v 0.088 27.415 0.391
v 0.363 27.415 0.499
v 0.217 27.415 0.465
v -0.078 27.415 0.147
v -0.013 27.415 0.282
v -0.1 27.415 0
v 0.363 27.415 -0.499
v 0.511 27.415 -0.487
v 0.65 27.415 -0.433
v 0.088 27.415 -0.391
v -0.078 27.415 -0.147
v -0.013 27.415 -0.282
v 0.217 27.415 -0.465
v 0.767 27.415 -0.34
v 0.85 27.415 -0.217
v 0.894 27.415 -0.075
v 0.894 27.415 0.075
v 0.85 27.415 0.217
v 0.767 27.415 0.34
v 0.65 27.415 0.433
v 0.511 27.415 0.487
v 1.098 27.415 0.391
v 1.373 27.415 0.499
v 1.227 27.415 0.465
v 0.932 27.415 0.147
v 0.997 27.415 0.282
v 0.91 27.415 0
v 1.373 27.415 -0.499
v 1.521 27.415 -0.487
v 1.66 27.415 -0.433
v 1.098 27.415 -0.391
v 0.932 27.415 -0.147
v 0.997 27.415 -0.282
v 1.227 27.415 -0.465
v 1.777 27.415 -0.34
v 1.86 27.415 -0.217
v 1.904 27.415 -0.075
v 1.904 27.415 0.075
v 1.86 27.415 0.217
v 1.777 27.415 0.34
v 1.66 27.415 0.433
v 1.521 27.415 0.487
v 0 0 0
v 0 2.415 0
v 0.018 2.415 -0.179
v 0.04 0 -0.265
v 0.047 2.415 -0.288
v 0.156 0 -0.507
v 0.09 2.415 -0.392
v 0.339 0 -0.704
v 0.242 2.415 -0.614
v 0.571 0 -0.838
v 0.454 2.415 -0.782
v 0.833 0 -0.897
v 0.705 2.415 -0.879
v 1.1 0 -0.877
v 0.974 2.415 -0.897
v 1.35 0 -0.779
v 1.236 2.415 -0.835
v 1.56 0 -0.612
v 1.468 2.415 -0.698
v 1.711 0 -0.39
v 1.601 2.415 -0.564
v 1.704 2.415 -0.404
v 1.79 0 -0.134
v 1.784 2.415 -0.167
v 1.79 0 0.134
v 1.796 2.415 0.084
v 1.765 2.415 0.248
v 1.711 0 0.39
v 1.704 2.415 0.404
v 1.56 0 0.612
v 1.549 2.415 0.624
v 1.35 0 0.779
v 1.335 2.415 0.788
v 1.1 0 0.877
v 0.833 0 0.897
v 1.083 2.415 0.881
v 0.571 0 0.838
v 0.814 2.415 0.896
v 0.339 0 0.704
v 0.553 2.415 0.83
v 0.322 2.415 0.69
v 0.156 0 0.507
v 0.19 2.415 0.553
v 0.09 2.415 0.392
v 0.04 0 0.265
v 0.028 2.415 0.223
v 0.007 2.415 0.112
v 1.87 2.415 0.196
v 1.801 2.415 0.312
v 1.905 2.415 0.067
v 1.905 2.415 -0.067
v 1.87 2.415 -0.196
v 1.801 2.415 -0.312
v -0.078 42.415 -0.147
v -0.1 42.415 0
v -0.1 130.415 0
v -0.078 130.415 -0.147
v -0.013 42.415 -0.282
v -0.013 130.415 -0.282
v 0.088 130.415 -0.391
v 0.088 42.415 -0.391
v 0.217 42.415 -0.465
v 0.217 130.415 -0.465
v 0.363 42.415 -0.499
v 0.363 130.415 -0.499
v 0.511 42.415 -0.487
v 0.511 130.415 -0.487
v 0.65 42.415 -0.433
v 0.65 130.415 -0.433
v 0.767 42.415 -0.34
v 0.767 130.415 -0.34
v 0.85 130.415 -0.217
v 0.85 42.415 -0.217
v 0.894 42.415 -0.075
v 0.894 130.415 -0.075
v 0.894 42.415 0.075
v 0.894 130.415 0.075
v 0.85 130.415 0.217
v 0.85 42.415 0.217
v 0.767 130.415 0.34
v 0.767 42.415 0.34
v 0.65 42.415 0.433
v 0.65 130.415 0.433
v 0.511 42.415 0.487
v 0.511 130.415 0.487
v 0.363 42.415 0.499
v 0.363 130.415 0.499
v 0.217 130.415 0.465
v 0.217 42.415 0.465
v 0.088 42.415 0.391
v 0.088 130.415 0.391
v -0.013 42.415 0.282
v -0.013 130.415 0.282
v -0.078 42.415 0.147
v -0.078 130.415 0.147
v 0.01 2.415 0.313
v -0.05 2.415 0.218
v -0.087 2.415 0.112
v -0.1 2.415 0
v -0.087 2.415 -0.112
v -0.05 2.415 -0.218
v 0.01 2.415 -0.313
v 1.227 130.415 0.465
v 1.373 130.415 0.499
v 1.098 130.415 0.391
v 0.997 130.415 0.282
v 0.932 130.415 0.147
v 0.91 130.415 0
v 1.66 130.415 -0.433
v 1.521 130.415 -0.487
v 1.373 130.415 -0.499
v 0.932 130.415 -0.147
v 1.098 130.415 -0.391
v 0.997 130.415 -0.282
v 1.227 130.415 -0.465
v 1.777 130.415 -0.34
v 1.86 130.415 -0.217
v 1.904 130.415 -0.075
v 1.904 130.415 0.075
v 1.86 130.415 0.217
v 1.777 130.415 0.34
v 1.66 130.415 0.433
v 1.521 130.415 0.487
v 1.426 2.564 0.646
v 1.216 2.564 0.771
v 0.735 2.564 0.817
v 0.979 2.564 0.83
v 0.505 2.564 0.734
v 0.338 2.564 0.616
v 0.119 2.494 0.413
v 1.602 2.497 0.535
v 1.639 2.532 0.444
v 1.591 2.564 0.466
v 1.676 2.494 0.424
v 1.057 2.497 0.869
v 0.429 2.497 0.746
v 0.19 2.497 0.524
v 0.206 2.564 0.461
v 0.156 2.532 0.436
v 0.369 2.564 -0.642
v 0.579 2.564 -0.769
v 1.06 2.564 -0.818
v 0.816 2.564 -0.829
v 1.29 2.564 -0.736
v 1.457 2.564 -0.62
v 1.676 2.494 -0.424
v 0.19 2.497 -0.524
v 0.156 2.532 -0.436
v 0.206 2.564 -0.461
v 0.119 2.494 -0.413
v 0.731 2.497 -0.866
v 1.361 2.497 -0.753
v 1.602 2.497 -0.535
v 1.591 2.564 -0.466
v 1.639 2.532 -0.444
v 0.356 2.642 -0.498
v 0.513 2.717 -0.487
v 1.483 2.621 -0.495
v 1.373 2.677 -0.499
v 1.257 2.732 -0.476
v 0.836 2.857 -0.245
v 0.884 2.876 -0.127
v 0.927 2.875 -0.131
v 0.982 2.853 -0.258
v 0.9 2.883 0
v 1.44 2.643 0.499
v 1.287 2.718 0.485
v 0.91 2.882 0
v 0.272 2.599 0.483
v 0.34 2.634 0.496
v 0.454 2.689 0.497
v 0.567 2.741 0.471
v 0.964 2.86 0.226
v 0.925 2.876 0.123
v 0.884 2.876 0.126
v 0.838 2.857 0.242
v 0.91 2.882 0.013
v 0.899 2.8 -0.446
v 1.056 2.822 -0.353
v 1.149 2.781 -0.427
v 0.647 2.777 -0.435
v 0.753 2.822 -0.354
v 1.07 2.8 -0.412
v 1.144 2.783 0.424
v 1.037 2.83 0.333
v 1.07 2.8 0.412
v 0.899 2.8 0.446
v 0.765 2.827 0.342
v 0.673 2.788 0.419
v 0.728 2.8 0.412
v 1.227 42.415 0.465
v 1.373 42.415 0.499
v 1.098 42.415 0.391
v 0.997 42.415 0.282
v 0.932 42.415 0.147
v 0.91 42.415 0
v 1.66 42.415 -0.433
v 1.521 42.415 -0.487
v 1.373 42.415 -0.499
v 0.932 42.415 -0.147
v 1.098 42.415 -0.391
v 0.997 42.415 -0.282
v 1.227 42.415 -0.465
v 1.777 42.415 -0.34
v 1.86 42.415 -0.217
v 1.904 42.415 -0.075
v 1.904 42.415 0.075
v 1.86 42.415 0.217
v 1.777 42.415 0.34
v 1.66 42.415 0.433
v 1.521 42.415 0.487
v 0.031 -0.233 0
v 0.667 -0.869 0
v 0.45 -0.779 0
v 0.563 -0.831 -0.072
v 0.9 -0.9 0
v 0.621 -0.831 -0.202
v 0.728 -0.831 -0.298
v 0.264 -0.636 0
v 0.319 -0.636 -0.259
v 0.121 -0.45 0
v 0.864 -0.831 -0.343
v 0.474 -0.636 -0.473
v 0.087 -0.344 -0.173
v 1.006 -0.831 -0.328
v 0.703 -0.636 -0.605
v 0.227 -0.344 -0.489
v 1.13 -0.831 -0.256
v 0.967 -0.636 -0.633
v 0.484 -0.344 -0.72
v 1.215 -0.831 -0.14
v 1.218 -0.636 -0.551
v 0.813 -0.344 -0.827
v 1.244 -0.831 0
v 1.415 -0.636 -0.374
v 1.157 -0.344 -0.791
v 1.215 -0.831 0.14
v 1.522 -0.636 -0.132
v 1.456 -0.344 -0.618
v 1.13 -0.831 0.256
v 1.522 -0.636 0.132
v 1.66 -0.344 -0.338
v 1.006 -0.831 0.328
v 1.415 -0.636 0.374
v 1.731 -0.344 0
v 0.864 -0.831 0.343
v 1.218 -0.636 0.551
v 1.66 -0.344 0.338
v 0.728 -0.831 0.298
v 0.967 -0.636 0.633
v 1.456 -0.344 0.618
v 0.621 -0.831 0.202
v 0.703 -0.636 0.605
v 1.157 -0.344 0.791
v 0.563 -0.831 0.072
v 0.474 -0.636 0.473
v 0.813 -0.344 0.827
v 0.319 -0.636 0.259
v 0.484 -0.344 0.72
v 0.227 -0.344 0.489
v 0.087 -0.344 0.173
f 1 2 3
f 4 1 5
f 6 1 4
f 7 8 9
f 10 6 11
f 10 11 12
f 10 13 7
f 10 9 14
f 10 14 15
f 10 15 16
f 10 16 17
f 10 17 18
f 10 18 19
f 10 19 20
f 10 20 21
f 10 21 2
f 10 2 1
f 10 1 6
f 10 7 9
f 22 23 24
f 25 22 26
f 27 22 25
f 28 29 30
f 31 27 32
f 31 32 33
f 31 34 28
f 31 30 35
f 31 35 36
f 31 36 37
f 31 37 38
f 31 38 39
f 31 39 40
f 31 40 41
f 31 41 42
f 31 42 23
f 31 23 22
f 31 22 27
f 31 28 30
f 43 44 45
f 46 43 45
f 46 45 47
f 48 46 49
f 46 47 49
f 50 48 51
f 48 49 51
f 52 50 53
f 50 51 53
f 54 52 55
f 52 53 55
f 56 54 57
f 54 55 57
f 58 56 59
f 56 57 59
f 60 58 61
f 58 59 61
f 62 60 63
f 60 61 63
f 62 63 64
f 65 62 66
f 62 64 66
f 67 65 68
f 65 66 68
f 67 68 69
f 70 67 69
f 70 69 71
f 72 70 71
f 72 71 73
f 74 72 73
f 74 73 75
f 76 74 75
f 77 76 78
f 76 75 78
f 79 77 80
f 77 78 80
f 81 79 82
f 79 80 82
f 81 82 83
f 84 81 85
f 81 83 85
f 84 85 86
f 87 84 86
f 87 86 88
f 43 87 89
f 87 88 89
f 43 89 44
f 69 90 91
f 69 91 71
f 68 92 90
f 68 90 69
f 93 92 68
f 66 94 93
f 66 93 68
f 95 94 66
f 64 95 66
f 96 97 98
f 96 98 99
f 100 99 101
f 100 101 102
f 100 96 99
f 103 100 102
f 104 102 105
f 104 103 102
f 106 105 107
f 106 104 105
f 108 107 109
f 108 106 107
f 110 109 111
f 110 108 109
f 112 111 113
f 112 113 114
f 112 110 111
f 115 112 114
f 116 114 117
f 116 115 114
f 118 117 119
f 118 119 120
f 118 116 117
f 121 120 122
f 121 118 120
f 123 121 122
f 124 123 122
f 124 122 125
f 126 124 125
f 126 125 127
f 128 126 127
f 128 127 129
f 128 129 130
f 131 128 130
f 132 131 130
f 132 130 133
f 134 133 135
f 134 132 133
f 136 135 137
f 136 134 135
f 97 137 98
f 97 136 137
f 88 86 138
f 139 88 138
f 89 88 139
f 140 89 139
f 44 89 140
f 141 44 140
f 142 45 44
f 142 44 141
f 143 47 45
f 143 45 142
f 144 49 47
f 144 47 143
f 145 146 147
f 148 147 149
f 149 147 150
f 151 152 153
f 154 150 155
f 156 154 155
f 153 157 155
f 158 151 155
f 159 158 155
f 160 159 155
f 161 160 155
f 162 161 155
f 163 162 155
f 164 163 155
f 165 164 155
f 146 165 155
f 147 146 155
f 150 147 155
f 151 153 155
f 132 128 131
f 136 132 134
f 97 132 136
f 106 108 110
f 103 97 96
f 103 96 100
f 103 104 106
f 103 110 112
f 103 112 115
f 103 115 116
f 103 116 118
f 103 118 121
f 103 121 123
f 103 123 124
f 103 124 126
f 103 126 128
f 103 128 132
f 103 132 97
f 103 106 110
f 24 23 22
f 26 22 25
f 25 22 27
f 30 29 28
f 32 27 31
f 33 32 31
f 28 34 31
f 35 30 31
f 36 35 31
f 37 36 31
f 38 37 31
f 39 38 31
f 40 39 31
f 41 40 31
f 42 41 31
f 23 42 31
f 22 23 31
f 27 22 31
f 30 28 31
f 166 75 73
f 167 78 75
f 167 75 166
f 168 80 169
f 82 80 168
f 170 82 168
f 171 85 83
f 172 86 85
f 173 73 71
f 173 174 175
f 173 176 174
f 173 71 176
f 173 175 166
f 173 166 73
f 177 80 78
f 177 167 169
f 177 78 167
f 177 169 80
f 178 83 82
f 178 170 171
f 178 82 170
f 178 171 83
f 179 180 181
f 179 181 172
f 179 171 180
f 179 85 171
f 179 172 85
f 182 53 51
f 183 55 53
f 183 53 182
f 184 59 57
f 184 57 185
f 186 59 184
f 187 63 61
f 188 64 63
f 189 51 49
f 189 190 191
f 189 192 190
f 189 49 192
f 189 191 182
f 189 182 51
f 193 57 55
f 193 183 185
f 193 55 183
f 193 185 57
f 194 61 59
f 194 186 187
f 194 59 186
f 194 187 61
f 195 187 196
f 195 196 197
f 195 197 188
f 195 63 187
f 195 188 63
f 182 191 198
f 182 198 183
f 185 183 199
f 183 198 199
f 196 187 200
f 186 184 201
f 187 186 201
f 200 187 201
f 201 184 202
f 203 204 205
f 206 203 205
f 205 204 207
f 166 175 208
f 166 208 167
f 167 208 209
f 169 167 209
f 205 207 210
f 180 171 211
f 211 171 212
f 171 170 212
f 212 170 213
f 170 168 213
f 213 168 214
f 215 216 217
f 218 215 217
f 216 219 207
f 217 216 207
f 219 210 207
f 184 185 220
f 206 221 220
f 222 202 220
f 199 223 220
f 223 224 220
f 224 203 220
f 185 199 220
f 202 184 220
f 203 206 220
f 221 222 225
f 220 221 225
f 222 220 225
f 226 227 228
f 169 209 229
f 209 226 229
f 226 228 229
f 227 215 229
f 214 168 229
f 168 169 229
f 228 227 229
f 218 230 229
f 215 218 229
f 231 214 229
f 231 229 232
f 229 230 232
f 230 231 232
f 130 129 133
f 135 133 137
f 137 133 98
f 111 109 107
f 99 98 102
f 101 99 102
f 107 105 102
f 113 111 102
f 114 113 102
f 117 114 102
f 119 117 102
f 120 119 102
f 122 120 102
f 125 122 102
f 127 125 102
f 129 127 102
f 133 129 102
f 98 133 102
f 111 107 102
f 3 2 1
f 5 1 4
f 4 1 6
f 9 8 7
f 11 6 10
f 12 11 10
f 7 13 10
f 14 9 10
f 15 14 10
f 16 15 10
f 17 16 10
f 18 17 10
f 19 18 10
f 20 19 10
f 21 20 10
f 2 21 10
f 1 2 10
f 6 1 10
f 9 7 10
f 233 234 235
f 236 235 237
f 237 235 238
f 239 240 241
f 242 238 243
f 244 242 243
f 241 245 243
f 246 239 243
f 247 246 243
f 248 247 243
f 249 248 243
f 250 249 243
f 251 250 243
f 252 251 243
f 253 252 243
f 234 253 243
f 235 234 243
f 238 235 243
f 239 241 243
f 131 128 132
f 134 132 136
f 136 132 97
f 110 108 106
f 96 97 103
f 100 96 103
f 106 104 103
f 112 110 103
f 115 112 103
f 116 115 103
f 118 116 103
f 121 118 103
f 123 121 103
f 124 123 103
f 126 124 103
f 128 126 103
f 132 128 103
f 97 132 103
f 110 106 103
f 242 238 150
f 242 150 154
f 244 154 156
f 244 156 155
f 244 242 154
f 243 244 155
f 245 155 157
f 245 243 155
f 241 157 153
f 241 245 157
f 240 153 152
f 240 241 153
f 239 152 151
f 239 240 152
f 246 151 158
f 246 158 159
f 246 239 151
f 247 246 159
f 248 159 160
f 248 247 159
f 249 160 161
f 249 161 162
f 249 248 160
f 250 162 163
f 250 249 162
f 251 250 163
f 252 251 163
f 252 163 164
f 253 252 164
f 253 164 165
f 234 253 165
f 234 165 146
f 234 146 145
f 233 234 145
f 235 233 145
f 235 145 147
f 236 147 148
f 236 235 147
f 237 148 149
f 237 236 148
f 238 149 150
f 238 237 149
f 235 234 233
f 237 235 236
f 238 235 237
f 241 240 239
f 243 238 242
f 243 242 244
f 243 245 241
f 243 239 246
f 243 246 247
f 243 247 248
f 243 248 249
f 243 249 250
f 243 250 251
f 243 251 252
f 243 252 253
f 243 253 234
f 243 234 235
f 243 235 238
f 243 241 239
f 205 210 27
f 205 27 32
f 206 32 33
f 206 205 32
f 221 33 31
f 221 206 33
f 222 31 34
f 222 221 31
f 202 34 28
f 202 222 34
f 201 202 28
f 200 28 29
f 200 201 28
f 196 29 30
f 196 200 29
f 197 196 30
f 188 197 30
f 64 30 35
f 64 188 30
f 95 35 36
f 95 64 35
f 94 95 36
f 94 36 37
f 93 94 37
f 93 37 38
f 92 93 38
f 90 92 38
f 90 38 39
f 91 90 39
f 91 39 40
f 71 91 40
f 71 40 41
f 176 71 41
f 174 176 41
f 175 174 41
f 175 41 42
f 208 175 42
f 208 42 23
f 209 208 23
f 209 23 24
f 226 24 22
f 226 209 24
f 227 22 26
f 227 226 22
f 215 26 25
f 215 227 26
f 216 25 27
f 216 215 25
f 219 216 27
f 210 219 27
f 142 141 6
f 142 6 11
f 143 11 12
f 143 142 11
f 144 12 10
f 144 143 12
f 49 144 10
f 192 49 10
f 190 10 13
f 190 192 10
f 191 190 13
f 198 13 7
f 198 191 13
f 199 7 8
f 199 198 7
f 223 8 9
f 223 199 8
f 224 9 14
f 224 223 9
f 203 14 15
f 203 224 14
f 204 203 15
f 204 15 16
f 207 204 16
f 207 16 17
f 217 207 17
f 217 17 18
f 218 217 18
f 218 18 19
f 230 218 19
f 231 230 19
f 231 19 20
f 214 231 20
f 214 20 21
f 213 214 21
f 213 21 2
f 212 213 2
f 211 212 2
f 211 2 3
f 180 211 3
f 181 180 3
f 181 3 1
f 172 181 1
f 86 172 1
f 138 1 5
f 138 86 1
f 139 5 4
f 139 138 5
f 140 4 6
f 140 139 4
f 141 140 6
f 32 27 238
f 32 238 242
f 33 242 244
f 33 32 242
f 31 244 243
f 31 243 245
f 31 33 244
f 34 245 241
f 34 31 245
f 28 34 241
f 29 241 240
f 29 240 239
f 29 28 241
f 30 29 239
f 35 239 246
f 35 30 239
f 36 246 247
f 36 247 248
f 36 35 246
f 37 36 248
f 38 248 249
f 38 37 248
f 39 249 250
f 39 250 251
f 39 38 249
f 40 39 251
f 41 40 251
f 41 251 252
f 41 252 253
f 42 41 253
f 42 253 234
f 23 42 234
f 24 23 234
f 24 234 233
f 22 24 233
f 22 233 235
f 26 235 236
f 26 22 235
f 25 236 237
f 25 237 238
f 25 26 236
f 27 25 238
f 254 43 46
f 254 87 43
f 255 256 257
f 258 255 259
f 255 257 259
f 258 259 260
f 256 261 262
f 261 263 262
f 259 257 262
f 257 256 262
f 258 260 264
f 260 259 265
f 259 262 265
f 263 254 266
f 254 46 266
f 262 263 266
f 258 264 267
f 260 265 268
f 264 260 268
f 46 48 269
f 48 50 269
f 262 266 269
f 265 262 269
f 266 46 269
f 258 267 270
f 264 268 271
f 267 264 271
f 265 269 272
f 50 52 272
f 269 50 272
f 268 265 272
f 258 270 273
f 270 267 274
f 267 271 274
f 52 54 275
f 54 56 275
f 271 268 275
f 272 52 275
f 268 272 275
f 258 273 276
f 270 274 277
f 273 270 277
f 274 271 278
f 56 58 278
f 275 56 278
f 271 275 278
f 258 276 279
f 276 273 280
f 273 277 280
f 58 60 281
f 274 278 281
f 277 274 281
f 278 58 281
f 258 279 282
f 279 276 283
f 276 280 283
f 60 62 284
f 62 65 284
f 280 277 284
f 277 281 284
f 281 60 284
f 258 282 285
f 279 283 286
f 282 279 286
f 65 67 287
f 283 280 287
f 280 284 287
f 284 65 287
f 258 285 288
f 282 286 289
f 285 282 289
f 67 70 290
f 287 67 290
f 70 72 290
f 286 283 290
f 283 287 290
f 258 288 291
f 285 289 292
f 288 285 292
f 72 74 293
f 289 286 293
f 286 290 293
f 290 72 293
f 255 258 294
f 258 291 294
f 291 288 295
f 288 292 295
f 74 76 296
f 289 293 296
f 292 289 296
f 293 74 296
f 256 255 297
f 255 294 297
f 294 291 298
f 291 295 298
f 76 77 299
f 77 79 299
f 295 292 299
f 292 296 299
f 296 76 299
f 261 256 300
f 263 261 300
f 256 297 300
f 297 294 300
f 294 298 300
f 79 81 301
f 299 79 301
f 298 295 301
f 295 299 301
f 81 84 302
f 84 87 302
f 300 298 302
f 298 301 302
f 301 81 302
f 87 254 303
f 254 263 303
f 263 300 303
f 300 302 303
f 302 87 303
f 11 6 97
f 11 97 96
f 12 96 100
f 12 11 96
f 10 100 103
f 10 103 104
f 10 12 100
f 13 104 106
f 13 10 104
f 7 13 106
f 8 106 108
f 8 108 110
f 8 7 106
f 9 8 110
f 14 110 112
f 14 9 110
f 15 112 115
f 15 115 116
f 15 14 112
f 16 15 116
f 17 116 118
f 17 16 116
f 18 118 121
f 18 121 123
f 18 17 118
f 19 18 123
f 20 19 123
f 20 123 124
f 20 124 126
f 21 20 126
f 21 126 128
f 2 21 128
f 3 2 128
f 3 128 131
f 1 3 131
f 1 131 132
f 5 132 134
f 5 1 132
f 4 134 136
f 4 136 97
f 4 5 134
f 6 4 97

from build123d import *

# Parameters (mm, degrees)
REDONDEO1_R               = 0.2
CROQUIS2_R                = 0.5
SALIENTE_EXTRUIR1_DEPTH   = 25
SALIENTE_EXTRUIR6_START   = -25
CROQUIS2_3_R              = 0.5
SALIENTE_EXTRUIR6_DEPTH   = 15
SALIENTE_EXTRUIR6_2_DEPTH = 15
SALIENTE_EXTRUIR7_START   = -40
CROQUIS2_4_R              = 0.5
SALIENTE_EXTRUIR7_DEPTH   = 88
SALIENTE_EXTRUIR7_2_DEPTH = 88


with BuildPart() as part:
    # Croquis1 → Revolución2 (revolve)
    with BuildSketch(Plane.XY):
        with BuildLine():
            Line((0, 0), (0, 2.5))
            ThreePointArc((0, 2.5), (0.411039098, 2.782931151), (0.9, 2.882532421))
            Line((0.9, 2.882532421), (0.9, -0.9))
            ThreePointArc((0.9, -0.9), (0.263603897, -0.636396103), (0, 0))
        make_face()
    revolve(axis=Axis((0.9, 2.882532421, 0), (0, -1, 0)))

    # Redondeo1
    redondeo1_edges = [part.edges().sort_by_distance(p)[0] for p in [
        (1.8, 2.5, 0),
    ]]
    fillet(redondeo1_edges, radius=REDONDEO1_R)

    # Croquis2 → Saliente-Extruir1 (add)
    with BuildSketch(Plane(origin=(0, 2.415156213, 0), x_dir=(-1, 0, 0), z_dir=(0, -1, 0))):
        with Locations((-1.41, 0)):
            Circle(CROQUIS2_R)
        with Locations((-0.4, 0)):
            Circle(CROQUIS2_R)
    extrude(amount=-SALIENTE_EXTRUIR1_DEPTH)


with BuildPart() as body_2:
    # Croquis2<3> → Saliente-Extruir6 (new body)
    with BuildSketch(Plane(origin=(0, 2.415156213, 0), x_dir=(-1, 0, 0), z_dir=(0, -1, 0)).offset(SALIENTE_EXTRUIR6_START)):
        with Locations((-1.41, 0)):
            Circle(CROQUIS2_3_R)
    extrude(amount=-SALIENTE_EXTRUIR6_DEPTH)


with BuildPart() as body_3:
    # Croquis2<3> → Saliente-Extruir6 2 (new body)
    with BuildSketch(Plane(origin=(0, 2.415156213, 0), x_dir=(-1, 0, 0), z_dir=(0, -1, 0)).offset(SALIENTE_EXTRUIR6_START)):
        with Locations((-0.4, 0)):
            Circle(CROQUIS2_3_R)
    extrude(amount=-SALIENTE_EXTRUIR6_2_DEPTH)


with BuildPart() as body_4:
    # Croquis2<4> → Saliente-Extruir7 (new body)
    with BuildSketch(Plane(origin=(0, 2.415156213, 0), x_dir=(-1, 0, 0), z_dir=(0, -1, 0)).offset(SALIENTE_EXTRUIR7_START)):
        with Locations((-1.41, 0)):
            Circle(CROQUIS2_4_R)
    extrude(amount=-SALIENTE_EXTRUIR7_DEPTH)


with BuildPart() as body_5:
    # Croquis2<4> → Saliente-Extruir7 2 (new body)
    with BuildSketch(Plane(origin=(0, 2.415156213, 0), x_dir=(-1, 0, 0), z_dir=(0, -1, 0)).offset(SALIENTE_EXTRUIR7_START)):
        with Locations((-0.4, 0)):
            Circle(CROQUIS2_4_R)
    extrude(amount=-SALIENTE_EXTRUIR7_2_DEPTH)


solid = Compound([part.part, body_2.part, body_3.part, body_4.part, body_5.part])
